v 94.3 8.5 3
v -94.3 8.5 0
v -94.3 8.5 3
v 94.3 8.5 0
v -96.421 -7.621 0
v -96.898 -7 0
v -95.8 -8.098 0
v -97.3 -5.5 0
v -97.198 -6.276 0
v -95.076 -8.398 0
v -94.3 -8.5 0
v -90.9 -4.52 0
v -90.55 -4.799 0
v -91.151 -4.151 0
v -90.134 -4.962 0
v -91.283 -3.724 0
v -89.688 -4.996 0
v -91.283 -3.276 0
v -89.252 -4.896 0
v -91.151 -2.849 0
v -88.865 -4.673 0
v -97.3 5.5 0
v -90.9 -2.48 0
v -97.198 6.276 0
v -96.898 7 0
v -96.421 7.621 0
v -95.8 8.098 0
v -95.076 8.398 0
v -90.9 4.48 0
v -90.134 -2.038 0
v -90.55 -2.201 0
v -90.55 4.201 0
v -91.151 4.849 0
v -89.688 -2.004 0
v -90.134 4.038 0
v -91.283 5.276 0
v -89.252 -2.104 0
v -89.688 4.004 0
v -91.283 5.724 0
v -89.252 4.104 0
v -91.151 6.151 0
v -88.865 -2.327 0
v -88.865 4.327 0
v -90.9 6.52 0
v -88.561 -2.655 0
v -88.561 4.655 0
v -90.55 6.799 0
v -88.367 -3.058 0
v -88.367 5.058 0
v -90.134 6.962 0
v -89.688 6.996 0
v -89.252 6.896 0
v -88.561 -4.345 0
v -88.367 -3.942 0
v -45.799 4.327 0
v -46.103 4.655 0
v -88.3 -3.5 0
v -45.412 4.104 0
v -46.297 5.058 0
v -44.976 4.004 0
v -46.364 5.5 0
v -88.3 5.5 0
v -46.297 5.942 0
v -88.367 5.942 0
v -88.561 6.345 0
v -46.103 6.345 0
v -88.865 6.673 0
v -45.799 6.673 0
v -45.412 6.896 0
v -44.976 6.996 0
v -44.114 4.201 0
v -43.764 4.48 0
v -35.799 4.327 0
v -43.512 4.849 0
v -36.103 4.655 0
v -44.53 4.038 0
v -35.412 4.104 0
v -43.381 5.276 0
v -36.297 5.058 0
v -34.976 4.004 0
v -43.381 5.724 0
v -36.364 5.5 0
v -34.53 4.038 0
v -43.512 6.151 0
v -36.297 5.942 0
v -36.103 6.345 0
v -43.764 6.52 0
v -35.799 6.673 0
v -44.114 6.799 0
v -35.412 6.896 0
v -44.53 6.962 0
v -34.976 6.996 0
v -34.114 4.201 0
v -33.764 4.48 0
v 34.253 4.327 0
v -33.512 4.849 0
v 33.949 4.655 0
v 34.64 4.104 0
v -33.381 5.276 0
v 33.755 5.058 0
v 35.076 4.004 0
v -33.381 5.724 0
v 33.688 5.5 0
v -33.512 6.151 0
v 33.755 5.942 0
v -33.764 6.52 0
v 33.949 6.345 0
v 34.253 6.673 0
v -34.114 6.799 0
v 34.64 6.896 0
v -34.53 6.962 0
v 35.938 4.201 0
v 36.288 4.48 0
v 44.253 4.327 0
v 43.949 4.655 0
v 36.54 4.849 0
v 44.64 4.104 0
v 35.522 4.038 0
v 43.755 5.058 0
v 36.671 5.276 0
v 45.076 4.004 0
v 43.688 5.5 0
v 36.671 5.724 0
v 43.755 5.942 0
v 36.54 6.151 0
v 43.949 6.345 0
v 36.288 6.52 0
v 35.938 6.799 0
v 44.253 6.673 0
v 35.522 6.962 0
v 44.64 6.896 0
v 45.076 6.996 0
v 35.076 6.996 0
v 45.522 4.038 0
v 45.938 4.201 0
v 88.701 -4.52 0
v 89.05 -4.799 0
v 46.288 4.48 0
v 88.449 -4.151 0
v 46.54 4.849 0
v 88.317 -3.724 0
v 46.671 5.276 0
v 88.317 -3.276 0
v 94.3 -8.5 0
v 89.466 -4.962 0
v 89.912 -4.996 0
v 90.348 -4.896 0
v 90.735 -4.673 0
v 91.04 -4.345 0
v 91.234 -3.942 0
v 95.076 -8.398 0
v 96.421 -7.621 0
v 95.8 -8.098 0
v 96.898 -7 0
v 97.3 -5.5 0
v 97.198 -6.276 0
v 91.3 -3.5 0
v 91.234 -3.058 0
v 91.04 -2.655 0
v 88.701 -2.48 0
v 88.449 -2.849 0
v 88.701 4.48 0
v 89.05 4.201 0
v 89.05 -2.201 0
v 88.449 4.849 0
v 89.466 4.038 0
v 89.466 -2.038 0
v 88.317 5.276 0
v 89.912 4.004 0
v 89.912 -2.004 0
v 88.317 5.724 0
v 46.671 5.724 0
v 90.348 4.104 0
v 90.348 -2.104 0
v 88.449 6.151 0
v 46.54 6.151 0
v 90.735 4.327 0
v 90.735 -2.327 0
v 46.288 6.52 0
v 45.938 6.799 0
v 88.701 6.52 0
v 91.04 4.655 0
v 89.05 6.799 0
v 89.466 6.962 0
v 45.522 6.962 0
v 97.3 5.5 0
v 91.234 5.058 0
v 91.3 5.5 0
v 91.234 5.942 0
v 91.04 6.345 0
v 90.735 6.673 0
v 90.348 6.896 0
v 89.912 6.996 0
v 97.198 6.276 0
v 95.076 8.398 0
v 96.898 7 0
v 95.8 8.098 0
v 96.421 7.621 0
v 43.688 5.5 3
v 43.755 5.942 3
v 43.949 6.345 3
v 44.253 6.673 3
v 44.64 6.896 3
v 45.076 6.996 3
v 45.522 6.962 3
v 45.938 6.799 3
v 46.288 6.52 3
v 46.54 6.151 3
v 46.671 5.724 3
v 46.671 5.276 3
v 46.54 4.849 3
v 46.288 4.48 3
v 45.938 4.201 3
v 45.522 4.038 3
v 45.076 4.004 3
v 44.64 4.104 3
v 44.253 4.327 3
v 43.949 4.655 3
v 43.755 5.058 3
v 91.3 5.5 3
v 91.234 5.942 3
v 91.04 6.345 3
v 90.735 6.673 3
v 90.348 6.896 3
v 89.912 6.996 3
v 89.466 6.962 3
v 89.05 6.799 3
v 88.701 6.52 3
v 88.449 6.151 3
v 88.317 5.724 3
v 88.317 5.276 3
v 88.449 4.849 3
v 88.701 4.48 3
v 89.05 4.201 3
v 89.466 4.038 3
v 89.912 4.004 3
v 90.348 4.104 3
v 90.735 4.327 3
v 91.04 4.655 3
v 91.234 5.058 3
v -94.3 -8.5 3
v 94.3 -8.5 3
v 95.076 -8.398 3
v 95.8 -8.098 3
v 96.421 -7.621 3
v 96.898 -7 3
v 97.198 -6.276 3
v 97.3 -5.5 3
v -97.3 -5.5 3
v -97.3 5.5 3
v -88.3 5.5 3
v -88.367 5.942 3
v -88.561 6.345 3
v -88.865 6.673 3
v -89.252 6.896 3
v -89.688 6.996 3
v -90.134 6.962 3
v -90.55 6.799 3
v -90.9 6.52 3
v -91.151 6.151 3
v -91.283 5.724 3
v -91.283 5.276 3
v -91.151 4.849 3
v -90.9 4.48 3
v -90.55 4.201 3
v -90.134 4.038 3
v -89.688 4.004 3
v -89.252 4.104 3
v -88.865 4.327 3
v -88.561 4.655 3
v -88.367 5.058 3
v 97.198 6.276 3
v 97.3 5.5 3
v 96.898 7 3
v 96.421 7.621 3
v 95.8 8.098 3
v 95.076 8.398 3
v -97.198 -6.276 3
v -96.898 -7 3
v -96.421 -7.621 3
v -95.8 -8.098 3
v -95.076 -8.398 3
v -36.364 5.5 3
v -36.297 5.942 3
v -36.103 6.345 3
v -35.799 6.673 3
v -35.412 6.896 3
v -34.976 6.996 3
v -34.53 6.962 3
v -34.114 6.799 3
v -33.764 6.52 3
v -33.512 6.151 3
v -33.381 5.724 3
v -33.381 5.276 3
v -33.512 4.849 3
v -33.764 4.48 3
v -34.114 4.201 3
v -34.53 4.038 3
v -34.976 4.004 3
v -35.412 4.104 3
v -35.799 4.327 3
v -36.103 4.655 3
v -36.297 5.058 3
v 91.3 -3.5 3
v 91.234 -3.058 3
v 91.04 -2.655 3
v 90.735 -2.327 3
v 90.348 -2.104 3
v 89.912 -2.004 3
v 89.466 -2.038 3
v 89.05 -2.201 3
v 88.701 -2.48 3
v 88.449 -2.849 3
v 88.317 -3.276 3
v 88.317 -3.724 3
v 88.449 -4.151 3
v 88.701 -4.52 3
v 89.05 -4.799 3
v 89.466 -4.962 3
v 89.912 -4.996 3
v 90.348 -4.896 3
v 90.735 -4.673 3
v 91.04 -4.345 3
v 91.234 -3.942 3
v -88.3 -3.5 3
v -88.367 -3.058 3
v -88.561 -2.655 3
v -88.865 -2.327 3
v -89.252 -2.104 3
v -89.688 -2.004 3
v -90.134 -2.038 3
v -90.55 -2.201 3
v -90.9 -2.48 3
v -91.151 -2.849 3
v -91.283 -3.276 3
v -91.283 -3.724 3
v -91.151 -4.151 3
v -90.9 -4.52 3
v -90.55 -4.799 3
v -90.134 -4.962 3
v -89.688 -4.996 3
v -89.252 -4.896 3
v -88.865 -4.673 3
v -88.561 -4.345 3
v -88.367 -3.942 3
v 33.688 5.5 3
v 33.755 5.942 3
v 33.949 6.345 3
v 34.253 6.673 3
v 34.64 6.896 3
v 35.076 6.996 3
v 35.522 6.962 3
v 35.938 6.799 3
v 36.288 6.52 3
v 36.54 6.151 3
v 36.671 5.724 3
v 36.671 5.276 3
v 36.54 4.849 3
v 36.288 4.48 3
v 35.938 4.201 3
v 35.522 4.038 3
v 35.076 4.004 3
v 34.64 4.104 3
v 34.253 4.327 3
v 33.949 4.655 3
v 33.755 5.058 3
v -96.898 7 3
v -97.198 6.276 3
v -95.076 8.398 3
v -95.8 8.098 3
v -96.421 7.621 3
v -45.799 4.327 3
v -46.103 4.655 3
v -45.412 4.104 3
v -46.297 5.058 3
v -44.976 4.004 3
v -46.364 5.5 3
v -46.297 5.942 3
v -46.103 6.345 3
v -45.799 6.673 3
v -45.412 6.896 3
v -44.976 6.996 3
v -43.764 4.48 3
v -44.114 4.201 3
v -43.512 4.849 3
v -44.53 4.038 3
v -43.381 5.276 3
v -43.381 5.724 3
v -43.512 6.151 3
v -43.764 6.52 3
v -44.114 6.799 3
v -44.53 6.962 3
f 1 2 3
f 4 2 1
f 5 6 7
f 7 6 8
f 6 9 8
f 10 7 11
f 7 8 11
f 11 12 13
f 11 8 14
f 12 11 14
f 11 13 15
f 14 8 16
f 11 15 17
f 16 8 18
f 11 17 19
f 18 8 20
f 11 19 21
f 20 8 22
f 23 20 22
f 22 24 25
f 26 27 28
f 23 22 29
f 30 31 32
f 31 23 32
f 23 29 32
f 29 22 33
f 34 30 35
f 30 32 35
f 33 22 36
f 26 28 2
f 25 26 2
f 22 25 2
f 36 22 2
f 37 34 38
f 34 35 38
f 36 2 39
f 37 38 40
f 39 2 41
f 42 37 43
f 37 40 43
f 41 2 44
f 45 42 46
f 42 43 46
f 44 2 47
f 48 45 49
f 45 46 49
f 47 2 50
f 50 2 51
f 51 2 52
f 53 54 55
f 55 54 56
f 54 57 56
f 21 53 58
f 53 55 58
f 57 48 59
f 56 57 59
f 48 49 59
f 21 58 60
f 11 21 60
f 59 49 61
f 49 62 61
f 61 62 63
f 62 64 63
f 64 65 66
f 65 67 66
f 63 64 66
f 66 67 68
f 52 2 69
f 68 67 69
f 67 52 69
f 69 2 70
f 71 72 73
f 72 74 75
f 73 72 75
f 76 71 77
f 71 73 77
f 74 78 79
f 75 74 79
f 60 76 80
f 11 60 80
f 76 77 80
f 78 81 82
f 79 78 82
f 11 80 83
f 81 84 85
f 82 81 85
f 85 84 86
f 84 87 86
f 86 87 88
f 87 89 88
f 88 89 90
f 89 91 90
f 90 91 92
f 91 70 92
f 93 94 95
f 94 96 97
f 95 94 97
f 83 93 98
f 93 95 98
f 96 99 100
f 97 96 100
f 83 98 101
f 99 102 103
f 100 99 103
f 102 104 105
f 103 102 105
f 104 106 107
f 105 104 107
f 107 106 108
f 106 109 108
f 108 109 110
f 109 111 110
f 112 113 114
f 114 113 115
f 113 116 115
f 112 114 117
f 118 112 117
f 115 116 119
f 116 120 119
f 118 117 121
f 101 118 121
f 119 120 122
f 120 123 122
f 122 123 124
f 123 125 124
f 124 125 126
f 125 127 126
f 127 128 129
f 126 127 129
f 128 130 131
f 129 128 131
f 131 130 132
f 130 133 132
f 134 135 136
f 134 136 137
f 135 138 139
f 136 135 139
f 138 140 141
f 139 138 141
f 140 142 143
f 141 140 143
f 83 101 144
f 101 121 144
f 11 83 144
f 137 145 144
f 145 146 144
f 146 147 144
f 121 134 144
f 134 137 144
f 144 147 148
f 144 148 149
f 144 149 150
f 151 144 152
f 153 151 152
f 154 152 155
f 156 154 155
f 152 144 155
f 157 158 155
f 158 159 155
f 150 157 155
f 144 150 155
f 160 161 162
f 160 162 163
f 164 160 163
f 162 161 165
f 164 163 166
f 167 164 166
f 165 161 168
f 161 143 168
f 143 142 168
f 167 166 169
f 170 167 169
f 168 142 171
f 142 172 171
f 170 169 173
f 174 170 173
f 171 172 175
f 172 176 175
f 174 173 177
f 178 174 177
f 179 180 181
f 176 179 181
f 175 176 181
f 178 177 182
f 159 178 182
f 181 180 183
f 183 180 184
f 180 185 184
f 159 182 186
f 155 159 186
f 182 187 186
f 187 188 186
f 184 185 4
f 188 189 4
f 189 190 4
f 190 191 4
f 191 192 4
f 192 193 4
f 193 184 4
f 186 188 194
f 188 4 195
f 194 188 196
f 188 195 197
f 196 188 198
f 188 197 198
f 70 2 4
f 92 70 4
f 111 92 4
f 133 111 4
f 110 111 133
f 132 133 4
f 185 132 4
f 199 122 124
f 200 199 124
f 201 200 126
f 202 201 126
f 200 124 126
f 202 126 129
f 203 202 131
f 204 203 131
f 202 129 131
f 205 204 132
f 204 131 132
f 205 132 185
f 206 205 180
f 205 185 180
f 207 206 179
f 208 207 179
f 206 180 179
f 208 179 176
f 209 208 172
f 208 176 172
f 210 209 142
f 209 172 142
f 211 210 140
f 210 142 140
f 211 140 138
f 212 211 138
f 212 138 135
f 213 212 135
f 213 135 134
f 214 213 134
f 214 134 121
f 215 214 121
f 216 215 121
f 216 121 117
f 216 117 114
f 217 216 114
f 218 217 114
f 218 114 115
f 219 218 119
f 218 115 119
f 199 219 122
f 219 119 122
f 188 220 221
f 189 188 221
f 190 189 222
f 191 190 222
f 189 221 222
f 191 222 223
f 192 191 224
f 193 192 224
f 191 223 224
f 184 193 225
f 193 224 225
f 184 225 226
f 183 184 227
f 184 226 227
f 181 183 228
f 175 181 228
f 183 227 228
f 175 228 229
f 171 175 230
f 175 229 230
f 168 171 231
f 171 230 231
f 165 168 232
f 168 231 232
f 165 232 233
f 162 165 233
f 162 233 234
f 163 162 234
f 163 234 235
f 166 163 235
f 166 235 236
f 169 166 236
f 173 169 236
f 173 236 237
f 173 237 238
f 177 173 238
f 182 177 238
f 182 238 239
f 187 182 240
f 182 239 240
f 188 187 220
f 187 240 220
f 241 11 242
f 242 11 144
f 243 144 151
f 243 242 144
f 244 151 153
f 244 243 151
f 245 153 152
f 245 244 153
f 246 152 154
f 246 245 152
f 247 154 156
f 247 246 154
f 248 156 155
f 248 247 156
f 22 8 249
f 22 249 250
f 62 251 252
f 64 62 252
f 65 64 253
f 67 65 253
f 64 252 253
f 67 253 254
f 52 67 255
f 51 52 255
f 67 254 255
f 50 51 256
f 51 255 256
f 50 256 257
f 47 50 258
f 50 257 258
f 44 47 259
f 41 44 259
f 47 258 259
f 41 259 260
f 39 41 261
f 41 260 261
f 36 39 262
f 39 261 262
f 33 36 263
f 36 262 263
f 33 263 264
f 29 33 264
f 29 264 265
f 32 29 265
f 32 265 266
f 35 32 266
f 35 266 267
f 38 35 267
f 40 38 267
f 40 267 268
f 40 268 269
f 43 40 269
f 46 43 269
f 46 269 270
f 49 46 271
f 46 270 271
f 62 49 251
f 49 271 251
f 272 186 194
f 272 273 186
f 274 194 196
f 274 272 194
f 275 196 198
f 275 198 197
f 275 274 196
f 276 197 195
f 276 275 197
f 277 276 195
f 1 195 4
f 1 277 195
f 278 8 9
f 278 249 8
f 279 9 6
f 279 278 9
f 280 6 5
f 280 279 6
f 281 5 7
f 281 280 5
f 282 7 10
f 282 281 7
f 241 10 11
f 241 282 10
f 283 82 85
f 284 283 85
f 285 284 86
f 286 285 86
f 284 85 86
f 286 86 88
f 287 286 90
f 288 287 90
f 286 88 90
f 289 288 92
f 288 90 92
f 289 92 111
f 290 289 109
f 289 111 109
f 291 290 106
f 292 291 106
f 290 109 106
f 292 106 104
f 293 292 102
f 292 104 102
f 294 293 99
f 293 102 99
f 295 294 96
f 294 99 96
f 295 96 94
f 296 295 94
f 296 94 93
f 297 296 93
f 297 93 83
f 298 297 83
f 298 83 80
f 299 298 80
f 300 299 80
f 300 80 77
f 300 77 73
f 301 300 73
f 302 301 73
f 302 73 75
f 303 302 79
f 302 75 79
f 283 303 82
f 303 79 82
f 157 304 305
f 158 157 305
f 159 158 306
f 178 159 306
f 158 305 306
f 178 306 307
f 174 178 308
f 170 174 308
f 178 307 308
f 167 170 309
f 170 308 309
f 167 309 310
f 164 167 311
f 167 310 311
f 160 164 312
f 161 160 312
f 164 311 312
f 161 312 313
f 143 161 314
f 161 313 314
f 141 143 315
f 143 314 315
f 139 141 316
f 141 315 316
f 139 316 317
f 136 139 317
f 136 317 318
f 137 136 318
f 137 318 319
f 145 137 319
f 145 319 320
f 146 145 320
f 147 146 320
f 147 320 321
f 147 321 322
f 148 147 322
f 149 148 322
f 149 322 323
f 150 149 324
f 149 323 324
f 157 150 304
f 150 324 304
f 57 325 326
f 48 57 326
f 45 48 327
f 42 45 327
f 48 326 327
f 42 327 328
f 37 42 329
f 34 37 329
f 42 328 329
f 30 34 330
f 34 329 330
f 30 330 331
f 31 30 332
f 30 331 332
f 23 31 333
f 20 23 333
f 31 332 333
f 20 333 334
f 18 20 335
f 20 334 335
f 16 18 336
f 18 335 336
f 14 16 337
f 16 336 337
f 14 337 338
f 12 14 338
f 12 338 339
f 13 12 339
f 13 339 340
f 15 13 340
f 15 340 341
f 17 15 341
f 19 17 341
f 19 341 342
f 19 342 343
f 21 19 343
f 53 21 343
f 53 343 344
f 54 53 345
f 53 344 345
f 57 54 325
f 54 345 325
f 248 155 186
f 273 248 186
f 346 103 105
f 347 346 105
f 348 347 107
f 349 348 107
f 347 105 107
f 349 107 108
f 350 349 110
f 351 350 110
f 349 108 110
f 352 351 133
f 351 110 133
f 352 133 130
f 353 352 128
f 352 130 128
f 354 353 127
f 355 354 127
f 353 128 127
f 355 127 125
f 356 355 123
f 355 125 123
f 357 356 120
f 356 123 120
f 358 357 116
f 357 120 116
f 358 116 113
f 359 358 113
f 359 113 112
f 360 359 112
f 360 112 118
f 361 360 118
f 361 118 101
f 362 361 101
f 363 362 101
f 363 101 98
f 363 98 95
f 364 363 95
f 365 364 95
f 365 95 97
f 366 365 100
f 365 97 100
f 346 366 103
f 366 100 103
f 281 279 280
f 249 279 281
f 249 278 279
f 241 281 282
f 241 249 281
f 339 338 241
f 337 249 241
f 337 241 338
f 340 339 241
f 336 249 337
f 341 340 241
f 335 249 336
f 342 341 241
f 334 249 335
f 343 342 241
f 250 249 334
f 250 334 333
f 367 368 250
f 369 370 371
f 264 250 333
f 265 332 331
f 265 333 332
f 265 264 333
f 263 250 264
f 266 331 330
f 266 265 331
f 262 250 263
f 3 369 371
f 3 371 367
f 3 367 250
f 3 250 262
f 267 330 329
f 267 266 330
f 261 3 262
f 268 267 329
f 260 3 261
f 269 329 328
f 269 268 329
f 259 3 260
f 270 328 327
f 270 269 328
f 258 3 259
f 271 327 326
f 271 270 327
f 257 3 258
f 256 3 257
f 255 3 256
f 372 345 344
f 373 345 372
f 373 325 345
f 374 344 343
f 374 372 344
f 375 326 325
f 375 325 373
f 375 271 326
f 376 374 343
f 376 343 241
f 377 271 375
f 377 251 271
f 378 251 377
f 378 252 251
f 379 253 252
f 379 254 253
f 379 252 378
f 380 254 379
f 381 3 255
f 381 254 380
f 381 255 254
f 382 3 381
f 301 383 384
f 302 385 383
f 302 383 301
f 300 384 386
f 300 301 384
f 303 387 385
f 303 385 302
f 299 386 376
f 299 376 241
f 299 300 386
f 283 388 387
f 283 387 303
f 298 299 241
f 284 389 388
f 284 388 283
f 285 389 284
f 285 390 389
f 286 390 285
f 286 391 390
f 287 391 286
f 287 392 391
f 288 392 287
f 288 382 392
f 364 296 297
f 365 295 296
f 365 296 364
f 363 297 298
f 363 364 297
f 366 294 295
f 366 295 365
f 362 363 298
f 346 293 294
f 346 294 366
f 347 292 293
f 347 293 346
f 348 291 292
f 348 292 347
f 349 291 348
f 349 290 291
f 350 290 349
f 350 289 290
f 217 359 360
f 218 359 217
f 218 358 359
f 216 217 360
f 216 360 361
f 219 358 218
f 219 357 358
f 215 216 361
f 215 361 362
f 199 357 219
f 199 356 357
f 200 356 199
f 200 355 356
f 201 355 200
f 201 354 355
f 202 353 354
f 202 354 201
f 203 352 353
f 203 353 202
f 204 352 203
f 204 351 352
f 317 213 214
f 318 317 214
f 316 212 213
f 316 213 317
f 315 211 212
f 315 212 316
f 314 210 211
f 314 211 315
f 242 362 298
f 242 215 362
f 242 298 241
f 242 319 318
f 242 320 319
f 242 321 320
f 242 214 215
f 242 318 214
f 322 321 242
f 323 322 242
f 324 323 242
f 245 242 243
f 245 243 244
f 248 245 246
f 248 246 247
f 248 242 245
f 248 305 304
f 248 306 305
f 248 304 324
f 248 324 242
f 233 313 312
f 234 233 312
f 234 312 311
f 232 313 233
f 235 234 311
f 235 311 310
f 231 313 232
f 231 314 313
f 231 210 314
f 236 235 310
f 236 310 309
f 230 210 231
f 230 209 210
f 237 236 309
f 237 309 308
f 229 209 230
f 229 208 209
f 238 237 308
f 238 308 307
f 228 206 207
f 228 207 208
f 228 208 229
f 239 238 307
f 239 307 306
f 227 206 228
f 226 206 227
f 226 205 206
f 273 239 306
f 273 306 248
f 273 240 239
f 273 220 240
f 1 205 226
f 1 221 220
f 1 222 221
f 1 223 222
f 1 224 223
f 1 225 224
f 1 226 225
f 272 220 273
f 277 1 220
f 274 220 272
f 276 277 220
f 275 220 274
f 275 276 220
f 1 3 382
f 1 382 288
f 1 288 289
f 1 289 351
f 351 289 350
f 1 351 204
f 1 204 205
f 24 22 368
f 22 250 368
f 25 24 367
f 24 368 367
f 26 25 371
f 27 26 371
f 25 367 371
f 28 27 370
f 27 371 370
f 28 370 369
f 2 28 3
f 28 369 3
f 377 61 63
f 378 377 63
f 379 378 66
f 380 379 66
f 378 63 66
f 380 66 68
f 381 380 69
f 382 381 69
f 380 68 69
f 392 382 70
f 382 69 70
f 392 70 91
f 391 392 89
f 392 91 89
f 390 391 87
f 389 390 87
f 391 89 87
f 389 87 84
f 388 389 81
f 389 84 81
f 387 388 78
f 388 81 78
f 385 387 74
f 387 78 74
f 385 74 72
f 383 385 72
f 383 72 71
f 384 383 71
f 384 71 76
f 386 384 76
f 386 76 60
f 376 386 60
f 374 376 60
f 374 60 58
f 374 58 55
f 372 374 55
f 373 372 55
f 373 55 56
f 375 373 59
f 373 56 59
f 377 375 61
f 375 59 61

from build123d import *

# Parameters (mm, degrees)
SKETCH_1_W          = 194.6
SKETCH_1_H          = 17
EXTRUDE_1_DEPTH     = 3
FILLET_1_R          = 3
SKETCH_2_R          = 1.5
CUT_EXTRUDE_1_DEPTH = 3
SKETCH_3_R          = 1.5
CUT_EXTRUDE_2_DEPTH = 3
SKETCH_5_R          = 1.5
CUT_EXTRUDE_3_DEPTH = 3


with BuildPart() as part:
    # 草图1 → 凸台-拉伸1 (new body)
    with BuildSketch(Plane.XY):
        Rectangle(SKETCH_1_W, SKETCH_1_H)
    extrude(amount=EXTRUDE_1_DEPTH)

    # 圆角1
    fillet_1_edges = [part.edges().sort_by_distance(p)[0] for p in [
        (97.3, -8.5, 1.5),
        (-97.3, -8.5, 1.5),
        (-97.3, 8.5, 1.5),
        (97.3, 8.5, 1.5),
    ]]
    fillet(fillet_1_edges, radius=FILLET_1_R)

    # 草图2 → 切除-拉伸1 (cut)
    with BuildSketch(Plane.XY.offset(3)):
        with Locations((89.800213401, 5.5)):
            Circle(SKETCH_2_R)
        with Locations((89.800213401, -3.5)):
            Circle(SKETCH_2_R)
        with Locations((-89.8, -3.5)):
            Circle(SKETCH_2_R)
        with Locations((-89.8, 5.5)):
            Circle(SKETCH_2_R)
    extrude(amount=-CUT_EXTRUDE_1_DEPTH, mode=Mode.SUBTRACT)

    # 草图3 → 切除-拉伸2 (cut)
    with BuildSketch(Plane(origin=(0, 0, 0), x_dir=(-1, 0, 0), z_dir=(0, 0, -1))):
        with Locations((44.863842933, 5.5)):
            Circle(SKETCH_3_R)
        with Locations((34.863842933, 5.5)):
            Circle(SKETCH_3_R)
    extrude(amount=-CUT_EXTRUDE_2_DEPTH, mode=Mode.SUBTRACT)

    # 草图5 → 切除-拉伸3 (cut)
    with BuildSketch(Plane(origin=(0, 0, 0), x_dir=(-1, 0, 0), z_dir=(0, 0, -1))):
        with Locations((-45.188251481, 5.5)):
            Circle(SKETCH_5_R)
        with Locations((-35.188251481, 5.5)):
            Circle(SKETCH_5_R)
    extrude(amount=-CUT_EXTRUDE_3_DEPTH, mode=Mode.SUBTRACT)


solid = part.part
